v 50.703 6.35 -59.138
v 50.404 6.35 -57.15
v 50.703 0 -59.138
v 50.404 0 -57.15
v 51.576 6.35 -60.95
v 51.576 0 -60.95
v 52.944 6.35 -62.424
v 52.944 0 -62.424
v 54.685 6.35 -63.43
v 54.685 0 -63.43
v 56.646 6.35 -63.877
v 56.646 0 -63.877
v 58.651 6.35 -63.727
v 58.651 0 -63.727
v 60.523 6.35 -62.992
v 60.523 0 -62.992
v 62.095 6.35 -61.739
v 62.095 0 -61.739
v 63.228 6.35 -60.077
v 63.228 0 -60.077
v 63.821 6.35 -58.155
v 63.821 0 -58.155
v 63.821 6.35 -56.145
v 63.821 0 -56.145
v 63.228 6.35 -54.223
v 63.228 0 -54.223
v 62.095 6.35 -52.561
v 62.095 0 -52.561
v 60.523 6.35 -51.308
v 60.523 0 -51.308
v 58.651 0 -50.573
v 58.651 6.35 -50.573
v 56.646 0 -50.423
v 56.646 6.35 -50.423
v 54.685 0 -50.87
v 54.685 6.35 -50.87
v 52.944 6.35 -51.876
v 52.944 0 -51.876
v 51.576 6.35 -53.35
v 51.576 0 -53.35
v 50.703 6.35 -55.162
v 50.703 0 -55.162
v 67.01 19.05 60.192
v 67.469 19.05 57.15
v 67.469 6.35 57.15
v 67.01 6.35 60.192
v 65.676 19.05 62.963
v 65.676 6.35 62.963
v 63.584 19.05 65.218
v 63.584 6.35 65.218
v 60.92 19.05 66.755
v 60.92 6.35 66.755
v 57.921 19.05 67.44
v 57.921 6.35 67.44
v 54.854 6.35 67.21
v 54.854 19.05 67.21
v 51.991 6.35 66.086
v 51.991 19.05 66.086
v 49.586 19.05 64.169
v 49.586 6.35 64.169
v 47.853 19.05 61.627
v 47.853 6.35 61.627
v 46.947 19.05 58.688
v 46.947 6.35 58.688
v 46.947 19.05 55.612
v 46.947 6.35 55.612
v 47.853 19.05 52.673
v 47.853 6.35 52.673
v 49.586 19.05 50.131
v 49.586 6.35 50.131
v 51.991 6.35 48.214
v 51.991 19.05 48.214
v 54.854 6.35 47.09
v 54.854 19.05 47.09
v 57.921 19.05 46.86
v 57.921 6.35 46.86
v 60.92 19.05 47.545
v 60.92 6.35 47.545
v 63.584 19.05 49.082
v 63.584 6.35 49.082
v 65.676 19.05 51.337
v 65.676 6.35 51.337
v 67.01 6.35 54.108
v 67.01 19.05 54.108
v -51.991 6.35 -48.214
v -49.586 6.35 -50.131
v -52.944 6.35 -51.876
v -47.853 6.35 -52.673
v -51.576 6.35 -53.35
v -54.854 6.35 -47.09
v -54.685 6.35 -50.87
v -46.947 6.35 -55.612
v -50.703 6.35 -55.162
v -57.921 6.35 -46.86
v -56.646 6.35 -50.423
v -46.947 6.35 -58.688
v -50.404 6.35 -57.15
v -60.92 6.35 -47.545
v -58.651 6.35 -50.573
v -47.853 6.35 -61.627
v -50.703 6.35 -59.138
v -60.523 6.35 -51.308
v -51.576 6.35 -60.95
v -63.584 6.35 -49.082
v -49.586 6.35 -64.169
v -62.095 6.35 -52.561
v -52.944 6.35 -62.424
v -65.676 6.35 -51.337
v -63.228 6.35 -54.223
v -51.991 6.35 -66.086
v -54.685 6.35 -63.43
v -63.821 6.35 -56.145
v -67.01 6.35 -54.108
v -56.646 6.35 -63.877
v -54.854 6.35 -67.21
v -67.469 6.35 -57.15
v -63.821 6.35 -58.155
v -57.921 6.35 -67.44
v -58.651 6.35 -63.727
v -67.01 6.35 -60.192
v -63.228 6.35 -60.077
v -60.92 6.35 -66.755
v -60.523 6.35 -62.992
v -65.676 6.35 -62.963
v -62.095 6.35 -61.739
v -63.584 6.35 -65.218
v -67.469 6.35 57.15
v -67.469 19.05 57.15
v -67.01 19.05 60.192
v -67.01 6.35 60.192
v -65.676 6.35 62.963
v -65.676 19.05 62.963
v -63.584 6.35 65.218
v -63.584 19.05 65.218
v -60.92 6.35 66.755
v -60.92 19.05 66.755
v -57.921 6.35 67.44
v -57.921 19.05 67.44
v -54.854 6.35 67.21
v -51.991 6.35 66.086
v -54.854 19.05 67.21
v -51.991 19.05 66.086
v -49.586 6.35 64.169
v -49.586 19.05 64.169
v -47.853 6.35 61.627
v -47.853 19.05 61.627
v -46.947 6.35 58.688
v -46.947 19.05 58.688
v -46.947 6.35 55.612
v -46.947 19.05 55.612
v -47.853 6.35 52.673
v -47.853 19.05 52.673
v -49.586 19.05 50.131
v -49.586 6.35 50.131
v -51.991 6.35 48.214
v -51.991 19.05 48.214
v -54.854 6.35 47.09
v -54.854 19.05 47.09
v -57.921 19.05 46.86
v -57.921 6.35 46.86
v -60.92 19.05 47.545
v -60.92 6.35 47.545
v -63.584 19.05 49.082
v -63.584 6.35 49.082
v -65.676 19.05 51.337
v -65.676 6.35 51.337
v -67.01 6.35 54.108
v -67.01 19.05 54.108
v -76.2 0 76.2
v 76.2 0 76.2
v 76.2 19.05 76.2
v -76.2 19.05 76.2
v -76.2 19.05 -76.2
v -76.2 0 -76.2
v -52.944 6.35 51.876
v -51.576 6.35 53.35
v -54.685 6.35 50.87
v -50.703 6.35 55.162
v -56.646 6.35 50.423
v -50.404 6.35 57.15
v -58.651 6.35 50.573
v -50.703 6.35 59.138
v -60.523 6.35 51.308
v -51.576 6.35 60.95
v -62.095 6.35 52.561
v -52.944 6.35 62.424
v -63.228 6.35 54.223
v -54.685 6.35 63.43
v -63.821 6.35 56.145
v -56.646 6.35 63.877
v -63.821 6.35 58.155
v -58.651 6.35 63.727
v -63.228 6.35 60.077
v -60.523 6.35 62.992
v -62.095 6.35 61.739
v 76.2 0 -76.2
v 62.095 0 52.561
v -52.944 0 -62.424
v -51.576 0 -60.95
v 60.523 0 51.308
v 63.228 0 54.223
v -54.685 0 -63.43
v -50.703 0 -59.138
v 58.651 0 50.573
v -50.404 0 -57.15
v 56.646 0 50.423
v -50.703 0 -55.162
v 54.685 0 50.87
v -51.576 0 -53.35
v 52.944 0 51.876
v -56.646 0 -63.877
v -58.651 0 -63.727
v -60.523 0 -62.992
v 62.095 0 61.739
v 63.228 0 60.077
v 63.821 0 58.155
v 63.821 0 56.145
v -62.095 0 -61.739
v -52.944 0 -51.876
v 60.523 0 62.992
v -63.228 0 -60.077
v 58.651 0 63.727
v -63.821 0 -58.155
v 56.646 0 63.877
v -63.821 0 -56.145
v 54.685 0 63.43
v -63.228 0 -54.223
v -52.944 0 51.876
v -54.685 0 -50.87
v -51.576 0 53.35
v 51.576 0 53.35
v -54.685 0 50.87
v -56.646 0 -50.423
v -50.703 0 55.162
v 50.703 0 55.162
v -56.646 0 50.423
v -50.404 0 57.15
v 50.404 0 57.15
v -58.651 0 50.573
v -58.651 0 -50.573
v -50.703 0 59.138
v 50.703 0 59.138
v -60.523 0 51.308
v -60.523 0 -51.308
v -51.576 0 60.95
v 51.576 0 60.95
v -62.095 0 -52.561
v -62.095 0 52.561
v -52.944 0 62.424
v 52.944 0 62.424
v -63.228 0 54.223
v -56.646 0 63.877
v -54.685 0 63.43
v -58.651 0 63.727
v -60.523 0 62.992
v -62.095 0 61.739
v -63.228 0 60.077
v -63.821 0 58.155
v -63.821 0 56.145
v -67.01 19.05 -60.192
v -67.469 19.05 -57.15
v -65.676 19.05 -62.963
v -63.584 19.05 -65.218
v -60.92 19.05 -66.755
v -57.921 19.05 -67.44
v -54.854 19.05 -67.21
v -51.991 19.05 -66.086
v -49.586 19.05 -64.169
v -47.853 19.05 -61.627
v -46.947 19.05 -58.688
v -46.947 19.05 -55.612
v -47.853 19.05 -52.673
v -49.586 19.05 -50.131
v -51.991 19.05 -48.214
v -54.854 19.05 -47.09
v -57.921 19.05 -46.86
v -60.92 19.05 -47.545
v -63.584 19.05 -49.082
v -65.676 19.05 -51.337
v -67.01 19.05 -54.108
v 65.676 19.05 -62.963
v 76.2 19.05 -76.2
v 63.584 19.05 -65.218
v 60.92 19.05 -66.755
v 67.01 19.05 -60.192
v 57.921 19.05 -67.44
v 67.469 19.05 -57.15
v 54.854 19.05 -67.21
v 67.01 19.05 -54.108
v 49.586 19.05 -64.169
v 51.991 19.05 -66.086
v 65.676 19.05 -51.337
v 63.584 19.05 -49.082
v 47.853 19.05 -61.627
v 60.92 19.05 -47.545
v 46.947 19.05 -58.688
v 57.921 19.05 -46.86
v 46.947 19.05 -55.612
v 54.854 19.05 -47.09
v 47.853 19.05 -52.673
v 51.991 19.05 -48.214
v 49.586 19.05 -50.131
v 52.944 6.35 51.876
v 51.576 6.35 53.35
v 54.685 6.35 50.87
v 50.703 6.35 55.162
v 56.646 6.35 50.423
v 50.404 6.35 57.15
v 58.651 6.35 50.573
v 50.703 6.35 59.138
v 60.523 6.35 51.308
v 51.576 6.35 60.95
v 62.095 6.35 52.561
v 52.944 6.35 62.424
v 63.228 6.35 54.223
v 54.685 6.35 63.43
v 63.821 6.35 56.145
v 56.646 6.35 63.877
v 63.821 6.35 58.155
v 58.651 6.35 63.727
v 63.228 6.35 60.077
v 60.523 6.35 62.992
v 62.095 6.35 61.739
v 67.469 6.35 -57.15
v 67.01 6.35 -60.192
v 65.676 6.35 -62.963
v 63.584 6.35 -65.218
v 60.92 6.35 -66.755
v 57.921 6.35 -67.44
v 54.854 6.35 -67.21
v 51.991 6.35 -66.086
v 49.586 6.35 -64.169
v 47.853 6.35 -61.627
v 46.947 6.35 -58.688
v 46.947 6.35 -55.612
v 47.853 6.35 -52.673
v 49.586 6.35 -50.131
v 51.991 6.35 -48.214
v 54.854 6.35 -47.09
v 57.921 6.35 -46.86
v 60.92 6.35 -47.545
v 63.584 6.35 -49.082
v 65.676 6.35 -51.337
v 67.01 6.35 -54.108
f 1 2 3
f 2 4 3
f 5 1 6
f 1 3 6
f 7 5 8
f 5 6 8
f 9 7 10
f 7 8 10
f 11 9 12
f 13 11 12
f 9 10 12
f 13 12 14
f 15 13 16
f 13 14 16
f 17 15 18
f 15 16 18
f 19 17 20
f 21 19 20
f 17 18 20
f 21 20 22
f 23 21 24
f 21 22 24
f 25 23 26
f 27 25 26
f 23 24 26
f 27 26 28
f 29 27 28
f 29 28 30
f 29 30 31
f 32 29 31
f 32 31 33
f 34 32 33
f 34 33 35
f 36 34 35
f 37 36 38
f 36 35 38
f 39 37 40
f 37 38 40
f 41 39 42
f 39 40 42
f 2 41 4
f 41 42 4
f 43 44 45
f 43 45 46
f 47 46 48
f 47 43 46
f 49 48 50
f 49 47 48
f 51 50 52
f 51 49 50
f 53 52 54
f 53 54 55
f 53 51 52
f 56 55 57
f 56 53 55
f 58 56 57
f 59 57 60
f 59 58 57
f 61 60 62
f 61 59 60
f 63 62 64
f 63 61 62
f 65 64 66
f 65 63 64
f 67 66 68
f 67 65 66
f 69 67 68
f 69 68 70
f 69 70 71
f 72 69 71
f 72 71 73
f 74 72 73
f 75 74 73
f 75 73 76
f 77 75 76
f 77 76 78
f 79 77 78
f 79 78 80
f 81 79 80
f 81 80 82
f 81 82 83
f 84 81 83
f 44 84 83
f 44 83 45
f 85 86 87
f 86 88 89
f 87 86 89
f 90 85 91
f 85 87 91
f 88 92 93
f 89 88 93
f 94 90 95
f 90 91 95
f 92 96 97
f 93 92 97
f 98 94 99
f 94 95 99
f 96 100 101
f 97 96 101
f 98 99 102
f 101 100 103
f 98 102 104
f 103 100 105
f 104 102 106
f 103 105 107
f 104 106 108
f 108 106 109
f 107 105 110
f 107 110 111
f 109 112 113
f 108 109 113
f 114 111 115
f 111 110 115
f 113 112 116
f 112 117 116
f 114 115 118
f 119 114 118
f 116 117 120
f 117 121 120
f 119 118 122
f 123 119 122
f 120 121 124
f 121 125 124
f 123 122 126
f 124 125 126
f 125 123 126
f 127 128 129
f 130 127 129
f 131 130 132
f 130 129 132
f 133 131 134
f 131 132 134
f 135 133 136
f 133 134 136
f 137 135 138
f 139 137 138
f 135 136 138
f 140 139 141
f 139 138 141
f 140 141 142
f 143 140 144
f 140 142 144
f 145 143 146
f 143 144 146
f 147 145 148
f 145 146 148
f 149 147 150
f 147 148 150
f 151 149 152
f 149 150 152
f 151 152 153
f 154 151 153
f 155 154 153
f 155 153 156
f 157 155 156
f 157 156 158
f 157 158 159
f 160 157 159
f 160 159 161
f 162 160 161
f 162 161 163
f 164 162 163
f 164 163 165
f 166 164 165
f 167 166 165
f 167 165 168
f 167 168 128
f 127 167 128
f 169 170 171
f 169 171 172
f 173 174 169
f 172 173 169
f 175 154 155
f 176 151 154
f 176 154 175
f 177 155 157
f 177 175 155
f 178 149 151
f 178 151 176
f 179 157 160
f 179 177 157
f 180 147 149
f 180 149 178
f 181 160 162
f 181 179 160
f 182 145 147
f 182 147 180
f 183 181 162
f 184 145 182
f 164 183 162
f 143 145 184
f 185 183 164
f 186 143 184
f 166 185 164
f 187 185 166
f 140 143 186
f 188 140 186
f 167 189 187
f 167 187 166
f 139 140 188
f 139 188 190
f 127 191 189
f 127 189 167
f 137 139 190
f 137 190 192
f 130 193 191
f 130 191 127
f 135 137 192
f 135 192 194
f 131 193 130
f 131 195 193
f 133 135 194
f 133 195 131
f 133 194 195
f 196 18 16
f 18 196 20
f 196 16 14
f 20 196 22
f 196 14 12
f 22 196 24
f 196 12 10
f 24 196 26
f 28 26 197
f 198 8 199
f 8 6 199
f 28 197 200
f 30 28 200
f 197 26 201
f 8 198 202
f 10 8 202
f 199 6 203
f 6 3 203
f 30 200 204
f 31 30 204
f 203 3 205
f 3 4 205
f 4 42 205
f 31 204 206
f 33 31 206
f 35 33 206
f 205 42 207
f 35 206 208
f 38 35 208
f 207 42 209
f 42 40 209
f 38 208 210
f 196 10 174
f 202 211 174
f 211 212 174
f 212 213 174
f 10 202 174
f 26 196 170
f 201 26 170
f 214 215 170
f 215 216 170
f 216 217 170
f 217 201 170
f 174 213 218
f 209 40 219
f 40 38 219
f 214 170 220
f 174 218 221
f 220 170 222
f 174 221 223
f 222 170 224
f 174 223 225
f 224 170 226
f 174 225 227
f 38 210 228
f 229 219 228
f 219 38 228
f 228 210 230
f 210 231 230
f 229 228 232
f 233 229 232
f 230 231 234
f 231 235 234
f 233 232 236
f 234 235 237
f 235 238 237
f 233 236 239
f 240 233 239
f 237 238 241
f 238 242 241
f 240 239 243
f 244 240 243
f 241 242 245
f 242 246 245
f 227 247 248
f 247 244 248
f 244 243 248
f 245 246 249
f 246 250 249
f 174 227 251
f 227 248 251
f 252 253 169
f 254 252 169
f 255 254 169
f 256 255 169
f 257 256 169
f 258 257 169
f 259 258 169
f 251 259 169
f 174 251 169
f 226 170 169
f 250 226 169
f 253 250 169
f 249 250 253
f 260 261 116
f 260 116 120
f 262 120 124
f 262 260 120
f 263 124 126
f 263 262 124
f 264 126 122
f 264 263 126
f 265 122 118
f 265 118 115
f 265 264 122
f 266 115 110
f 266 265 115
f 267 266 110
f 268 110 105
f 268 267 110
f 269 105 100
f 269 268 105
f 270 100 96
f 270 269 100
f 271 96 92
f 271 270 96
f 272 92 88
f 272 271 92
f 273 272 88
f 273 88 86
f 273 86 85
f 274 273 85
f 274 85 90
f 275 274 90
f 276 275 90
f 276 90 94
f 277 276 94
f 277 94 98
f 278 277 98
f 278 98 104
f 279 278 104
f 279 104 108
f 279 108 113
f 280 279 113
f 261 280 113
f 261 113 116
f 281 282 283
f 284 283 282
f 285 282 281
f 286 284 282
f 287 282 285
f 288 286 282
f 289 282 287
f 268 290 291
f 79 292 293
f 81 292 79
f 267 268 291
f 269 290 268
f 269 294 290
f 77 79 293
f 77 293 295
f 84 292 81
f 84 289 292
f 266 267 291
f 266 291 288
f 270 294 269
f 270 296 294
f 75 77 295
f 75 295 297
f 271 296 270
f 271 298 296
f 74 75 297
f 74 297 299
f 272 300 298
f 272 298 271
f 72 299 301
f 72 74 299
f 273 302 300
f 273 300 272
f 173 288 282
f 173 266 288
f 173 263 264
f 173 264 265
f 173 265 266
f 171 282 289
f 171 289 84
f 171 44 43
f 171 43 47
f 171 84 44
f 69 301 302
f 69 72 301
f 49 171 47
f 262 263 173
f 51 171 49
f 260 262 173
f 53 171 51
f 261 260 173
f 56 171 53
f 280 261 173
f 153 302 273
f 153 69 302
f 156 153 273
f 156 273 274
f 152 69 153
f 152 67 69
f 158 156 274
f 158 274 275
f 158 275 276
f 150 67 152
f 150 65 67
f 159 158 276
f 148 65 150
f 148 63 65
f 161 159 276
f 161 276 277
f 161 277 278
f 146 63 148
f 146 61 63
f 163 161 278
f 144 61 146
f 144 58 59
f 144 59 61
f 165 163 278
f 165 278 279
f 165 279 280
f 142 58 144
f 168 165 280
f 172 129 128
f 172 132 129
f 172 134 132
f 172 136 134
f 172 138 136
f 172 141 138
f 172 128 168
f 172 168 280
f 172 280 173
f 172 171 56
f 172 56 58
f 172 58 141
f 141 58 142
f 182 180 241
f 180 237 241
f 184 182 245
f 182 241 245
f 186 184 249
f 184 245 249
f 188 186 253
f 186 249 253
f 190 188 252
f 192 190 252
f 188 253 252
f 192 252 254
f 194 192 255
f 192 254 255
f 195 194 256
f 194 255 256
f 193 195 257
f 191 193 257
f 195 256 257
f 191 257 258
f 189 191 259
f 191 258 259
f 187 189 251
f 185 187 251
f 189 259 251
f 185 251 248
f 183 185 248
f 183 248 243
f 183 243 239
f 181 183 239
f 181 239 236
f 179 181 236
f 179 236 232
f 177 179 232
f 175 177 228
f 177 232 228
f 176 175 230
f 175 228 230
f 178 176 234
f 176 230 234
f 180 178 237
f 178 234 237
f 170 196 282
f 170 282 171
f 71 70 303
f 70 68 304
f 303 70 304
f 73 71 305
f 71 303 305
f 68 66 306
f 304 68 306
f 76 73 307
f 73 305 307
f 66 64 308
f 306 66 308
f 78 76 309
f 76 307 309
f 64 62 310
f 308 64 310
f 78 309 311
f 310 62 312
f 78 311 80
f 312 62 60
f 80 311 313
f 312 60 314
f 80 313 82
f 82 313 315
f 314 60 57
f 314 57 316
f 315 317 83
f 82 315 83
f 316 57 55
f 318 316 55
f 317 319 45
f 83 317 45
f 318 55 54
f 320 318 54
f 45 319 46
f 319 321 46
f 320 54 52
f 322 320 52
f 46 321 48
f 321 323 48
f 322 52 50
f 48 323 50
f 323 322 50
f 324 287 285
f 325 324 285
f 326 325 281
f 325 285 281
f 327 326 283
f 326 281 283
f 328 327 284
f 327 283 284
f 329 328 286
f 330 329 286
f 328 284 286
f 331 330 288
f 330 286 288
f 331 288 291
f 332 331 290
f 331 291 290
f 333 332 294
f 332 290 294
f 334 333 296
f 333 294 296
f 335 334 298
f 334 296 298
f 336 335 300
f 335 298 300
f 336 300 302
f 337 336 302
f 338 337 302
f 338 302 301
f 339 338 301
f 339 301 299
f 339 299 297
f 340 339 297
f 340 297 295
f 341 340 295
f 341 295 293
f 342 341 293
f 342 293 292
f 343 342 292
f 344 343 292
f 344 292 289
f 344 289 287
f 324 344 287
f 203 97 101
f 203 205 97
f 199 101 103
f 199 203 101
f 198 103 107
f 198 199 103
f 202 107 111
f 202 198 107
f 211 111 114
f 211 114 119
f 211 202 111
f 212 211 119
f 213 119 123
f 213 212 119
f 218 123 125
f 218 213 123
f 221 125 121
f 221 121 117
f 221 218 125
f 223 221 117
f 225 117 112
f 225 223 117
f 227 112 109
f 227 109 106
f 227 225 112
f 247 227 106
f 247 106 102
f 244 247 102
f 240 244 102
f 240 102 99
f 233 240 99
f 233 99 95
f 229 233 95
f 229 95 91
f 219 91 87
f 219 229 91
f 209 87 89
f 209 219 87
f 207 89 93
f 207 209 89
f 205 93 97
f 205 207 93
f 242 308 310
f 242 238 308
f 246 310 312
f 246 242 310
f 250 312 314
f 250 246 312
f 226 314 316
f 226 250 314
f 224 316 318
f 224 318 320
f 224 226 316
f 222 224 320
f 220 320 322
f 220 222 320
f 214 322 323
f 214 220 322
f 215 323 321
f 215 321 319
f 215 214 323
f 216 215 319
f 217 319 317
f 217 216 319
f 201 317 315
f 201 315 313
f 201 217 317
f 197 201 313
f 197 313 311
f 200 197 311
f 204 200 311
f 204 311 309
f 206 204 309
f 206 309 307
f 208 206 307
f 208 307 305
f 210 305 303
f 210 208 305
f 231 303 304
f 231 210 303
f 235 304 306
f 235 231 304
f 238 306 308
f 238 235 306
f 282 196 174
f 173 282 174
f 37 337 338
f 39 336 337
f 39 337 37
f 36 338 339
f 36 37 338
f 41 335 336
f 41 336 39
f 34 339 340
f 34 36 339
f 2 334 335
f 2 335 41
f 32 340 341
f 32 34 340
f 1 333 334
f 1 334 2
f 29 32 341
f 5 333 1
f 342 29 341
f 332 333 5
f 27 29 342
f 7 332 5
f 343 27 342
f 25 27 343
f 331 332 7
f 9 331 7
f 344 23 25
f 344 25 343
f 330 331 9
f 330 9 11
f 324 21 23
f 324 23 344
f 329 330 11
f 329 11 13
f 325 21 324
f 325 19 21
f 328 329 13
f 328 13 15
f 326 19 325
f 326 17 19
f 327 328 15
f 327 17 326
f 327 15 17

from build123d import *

# Parameters (mm, degrees)
SKETCH1_W                                        = 76.2
SKETCH1_H                                        = 76.2
BOSS_EXTRUDE1_DEPTH                              = 19.05
CBORE_FOR_1_2_SOCKET_HEAD_CAP_SCREW1_D           = 13.49248
CBORE_FOR_1_2_SOCKET_HEAD_CAP_SCREW1_CBORE_D     = 20.6375
CBORE_FOR_1_2_SOCKET_HEAD_CAP_SCREW1_CBORE_DEPTH = 12.7


with BuildPart() as part:
    # Sketch1 → Boss-Extrude1 (new body)
    with BuildSketch(Plane(origin=(0, 0, 0), x_dir=(1, 0, 0), z_dir=(0, 1, 0))):
        with Locations((38.1, 38.1)):
            Rectangle(SKETCH1_W, SKETCH1_H)
    extrude(amount=BOSS_EXTRUDE1_DEPTH)

    # CBORE for 1/2 Socket Head Cap Screw1 (through all)
    with Locations(Plane(origin=(0, 19.05, 0), x_dir=(1, 0, 0), z_dir=(0, 1, 0))):
        with Locations((57.15, 57.15)):
            CounterBoreHole(CBORE_FOR_1_2_SOCKET_HEAD_CAP_SCREW1_D / 2, CBORE_FOR_1_2_SOCKET_HEAD_CAP_SCREW1_CBORE_D / 2, CBORE_FOR_1_2_SOCKET_HEAD_CAP_SCREW1_CBORE_DEPTH)

    # Mirror1: part across plane


with BuildPart() as part_1:
    add(part.part)
    add(part.part.mirror(Plane(origin=(0, 19.05, 0), x_dir=(1, 0, 0), z_dir=(0, 0, -1))))

    # Mirror2: part across plane


with BuildPart() as part_2:
    add(part_1.part)
    add(part_1.part.mirror(Plane(origin=(0, 19.05, 0), x_dir=(0, 0, 1), z_dir=(1, 0, 0))))


solid = part_2.part
